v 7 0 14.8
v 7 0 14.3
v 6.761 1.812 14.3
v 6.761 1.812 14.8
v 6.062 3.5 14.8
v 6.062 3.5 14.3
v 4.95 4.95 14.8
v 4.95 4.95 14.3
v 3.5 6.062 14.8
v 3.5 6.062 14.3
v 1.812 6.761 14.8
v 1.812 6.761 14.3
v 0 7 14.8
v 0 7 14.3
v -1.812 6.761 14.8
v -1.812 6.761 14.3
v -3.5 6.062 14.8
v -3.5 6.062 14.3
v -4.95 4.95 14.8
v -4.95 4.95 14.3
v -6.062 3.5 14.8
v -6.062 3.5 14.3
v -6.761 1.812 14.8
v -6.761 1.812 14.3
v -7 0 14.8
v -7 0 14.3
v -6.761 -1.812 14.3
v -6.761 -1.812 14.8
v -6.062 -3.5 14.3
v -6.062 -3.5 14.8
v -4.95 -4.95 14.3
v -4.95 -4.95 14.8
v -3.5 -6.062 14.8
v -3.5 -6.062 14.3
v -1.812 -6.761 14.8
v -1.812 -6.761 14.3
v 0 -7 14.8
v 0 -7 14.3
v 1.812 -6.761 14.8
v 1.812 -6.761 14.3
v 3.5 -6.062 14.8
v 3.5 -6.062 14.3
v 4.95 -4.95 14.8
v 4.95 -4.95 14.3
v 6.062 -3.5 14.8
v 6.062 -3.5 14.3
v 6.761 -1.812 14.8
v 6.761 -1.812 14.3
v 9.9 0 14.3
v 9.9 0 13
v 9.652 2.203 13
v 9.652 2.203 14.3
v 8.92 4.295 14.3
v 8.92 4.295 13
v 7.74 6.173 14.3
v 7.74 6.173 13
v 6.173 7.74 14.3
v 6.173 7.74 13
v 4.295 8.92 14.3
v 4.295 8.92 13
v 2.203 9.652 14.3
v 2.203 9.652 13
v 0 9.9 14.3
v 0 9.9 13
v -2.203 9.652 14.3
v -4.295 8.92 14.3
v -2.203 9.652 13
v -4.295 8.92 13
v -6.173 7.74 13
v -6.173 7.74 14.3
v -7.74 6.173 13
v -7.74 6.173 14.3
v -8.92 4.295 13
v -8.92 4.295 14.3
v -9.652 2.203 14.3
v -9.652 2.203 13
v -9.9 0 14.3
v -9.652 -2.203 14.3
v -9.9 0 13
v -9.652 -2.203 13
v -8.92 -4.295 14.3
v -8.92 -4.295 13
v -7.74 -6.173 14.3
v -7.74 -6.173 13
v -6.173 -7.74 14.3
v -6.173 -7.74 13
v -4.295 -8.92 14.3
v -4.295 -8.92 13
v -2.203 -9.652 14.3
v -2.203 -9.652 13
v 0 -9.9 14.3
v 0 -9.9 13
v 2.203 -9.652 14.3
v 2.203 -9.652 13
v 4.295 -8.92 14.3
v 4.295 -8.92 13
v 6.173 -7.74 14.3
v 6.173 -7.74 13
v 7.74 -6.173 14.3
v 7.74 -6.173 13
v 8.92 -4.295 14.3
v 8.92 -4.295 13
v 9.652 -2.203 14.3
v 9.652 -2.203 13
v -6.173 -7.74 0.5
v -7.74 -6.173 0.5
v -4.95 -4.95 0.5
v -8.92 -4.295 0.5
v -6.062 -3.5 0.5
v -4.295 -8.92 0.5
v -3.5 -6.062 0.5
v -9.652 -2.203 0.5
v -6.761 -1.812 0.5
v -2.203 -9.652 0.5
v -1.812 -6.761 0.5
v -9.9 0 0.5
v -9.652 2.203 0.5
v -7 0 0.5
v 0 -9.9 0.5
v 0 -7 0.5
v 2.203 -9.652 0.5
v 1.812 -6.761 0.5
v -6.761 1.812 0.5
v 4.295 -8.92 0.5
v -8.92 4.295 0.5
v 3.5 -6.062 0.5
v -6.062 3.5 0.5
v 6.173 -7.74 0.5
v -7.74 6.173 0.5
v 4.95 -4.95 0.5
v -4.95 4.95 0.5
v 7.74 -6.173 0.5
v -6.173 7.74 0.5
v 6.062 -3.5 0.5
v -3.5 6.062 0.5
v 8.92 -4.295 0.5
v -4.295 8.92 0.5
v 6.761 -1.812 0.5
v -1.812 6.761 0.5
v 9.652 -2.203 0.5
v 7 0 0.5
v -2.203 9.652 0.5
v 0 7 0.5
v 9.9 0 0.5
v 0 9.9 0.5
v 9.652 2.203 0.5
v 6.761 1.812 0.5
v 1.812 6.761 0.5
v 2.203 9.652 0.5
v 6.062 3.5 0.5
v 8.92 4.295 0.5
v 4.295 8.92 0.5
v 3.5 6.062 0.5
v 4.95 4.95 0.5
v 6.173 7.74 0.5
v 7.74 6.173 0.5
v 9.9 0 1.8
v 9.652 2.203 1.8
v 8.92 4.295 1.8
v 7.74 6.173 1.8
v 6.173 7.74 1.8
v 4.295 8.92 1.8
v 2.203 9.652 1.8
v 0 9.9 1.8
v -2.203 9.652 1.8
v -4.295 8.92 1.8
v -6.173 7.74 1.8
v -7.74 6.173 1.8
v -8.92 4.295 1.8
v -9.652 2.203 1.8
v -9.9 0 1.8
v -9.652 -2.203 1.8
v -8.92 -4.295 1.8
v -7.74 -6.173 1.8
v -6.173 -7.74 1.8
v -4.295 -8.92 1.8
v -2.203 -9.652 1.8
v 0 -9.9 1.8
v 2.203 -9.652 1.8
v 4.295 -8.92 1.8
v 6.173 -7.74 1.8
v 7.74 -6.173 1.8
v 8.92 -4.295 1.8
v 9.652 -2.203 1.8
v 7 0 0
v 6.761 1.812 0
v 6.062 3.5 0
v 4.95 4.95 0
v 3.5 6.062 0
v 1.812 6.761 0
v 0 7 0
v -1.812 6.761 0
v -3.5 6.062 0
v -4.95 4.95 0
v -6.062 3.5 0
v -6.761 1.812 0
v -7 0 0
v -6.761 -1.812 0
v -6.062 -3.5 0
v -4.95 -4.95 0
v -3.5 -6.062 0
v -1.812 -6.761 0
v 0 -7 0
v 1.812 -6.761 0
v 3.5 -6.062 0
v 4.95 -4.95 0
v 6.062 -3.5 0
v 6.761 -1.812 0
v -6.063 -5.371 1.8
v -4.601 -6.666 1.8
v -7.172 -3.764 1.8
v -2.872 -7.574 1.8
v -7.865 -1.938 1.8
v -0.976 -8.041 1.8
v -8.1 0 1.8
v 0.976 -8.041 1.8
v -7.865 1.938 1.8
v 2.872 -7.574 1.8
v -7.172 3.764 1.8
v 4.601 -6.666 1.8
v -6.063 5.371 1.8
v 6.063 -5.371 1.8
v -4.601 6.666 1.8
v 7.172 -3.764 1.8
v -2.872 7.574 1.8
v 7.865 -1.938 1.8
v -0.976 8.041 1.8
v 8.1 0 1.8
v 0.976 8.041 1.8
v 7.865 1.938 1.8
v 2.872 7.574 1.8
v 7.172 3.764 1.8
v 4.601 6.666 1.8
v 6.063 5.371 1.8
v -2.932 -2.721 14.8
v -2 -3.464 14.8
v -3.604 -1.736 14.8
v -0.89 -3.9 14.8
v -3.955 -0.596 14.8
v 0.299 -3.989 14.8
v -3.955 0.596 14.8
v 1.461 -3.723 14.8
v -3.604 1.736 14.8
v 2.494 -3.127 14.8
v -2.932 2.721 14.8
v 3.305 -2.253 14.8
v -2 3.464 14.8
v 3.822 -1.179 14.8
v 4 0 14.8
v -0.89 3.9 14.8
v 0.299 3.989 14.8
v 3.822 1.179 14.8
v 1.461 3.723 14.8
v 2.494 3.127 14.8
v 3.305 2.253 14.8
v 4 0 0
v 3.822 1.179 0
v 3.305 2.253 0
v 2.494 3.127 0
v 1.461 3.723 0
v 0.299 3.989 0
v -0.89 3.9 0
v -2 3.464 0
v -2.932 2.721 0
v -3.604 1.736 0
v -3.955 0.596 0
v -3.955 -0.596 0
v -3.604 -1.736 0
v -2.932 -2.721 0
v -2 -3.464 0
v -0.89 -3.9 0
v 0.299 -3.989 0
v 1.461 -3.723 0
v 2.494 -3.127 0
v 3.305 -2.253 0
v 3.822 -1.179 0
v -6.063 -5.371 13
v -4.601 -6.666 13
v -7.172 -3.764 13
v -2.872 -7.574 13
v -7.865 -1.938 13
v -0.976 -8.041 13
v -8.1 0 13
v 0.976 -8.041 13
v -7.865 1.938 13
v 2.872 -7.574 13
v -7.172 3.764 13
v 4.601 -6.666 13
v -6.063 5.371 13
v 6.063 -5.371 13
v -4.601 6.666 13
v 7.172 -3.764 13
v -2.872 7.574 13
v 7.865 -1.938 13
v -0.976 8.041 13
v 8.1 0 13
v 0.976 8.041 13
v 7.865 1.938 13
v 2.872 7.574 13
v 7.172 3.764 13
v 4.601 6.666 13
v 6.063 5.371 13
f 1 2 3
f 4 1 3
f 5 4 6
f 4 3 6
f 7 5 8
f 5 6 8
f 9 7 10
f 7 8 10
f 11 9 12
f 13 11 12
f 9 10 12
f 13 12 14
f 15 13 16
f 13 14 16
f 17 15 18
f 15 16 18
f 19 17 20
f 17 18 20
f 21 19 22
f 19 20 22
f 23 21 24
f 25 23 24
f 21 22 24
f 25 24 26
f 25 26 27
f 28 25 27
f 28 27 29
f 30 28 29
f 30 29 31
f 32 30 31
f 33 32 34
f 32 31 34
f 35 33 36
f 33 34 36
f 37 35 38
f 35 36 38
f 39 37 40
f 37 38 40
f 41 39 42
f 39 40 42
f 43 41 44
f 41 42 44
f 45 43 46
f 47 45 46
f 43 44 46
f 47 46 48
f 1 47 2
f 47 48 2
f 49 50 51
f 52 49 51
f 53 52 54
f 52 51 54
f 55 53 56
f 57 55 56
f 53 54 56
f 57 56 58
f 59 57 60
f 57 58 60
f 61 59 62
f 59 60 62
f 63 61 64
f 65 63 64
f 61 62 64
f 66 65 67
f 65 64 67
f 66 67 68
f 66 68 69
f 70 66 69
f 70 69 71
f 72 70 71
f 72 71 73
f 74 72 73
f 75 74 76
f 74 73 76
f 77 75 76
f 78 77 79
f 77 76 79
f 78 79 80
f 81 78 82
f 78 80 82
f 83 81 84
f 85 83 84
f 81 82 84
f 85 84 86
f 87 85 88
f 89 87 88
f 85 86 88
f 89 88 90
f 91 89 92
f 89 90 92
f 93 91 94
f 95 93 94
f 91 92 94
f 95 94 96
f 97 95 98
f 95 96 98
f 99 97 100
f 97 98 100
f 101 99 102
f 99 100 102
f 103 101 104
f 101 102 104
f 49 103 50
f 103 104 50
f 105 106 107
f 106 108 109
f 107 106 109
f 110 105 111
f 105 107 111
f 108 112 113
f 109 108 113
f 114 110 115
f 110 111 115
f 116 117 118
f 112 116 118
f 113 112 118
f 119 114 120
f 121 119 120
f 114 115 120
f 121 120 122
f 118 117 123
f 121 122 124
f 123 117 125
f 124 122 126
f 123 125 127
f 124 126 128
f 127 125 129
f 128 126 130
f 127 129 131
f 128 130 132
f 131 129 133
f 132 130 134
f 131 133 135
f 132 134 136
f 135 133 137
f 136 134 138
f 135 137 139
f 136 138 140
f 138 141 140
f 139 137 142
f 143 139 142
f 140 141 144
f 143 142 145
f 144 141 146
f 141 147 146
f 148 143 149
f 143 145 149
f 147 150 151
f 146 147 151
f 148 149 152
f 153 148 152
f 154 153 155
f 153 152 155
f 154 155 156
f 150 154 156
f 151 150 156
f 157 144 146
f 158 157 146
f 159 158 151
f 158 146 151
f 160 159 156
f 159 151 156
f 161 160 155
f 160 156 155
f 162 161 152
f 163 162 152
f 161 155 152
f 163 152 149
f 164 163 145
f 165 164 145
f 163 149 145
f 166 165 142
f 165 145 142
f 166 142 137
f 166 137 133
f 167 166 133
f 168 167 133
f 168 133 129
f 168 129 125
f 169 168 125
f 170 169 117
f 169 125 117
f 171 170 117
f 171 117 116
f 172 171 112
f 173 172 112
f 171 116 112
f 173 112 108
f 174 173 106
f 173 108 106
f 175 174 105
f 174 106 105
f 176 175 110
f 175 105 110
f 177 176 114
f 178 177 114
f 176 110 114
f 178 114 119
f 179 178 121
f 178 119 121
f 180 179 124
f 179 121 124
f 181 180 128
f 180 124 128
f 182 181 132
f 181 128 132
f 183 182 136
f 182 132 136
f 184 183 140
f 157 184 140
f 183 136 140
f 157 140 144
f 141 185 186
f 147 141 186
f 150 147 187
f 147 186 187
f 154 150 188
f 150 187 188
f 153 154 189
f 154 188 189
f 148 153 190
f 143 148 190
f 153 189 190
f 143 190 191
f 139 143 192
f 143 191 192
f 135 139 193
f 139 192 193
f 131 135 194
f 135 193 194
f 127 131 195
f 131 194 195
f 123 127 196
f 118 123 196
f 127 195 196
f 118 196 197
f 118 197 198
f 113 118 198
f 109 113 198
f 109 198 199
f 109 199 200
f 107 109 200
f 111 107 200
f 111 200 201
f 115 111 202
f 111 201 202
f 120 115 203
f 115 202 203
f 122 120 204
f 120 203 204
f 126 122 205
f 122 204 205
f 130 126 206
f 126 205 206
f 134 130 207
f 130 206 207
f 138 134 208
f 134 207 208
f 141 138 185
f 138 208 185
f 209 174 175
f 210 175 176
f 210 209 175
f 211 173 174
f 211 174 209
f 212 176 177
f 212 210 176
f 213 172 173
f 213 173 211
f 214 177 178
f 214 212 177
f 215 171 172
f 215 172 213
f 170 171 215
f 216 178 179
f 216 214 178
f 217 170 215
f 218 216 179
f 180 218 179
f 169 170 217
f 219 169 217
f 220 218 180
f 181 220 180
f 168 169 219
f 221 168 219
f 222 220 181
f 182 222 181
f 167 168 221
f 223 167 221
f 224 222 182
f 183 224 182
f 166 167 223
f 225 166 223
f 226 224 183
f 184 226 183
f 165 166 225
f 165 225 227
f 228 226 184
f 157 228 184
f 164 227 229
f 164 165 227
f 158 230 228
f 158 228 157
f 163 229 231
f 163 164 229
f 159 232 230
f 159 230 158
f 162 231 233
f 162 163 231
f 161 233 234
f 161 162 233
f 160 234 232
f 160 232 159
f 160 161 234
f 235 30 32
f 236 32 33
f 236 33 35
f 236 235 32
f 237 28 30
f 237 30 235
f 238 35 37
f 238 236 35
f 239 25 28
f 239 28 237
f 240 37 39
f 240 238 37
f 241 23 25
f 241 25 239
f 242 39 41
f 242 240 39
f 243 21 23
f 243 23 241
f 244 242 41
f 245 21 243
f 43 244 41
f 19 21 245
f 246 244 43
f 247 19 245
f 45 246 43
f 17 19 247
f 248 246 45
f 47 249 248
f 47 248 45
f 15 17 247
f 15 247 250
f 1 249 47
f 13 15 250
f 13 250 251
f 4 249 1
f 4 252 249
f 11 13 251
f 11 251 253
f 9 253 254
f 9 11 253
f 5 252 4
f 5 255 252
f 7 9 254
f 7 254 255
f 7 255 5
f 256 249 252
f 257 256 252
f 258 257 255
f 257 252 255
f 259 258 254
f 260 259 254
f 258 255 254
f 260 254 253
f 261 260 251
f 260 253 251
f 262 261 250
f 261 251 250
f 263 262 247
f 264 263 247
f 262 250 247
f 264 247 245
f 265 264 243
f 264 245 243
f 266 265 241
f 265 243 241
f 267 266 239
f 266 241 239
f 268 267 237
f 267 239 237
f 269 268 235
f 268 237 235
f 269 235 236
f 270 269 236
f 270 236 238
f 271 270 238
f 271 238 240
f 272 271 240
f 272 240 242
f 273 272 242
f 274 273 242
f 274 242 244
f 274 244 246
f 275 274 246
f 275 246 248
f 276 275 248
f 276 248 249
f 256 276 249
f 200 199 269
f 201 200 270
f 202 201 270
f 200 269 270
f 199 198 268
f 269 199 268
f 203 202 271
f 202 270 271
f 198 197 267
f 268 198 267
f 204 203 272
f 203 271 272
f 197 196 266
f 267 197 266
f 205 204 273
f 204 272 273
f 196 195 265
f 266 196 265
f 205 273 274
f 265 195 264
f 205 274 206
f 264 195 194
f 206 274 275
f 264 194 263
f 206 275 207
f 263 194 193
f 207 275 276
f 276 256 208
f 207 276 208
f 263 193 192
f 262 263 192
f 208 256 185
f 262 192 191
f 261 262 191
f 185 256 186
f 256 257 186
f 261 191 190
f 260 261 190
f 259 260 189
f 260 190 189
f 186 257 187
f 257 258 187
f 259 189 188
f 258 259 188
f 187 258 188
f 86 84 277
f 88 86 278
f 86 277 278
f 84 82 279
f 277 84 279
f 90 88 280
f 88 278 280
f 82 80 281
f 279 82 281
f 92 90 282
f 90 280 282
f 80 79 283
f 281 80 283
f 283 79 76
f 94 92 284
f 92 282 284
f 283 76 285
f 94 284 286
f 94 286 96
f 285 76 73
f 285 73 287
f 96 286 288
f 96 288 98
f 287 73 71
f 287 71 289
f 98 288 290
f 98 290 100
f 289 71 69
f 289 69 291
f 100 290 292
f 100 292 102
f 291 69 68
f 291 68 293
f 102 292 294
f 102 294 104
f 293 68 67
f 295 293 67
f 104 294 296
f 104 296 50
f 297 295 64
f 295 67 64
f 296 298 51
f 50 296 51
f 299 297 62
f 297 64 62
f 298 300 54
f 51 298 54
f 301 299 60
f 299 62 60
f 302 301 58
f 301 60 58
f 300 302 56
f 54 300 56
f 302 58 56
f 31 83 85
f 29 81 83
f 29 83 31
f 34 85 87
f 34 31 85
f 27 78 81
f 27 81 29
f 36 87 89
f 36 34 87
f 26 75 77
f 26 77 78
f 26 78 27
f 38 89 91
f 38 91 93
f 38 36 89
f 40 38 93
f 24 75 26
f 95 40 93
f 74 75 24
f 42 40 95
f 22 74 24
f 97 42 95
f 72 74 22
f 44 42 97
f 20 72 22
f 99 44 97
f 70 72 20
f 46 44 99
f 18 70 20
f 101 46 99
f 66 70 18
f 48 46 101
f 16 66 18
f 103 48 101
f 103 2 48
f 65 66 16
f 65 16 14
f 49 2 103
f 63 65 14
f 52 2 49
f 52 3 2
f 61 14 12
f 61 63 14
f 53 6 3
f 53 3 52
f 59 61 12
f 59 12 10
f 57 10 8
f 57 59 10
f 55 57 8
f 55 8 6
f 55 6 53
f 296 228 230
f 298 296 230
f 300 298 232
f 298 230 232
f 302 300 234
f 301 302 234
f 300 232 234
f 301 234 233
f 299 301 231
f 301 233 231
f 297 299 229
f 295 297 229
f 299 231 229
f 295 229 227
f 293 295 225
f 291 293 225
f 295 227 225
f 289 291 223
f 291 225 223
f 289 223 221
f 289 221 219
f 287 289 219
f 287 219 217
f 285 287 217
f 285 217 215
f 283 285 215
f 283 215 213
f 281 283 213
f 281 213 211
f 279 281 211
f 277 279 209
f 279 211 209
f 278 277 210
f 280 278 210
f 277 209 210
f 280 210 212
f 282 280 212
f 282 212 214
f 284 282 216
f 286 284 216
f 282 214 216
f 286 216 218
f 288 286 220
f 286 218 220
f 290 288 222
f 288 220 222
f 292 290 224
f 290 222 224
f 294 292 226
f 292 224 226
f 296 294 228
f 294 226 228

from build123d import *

# Parameters (mm, degrees)
SKETCH1_R           = 7
BOSS_EXTRUDE1_DEPTH = 0.5
SKETCH2_R           = 9.9
BOSS_EXTRUDE2_DEPTH = 1.3
SKETCH3_R           = 8.1
BOSS_EXTRUDE3_DEPTH = 11.2
SKETCH4_R           = 9.9
BOSS_EXTRUDE4_DEPTH = 1.3
SKETCH5_R           = 7
BOSS_EXTRUDE5_DEPTH = 0.5
SKETCH6_R           = 4
CUT_EXTRUDE1_DEPTH  = 21.373021376


with BuildPart() as part:
    # Sketch1 → Boss-Extrude1 (new body)
    with BuildSketch(Plane.XY):
        Circle(SKETCH1_R)
    extrude(amount=BOSS_EXTRUDE1_DEPTH)

    # Sketch2 → Boss-Extrude2 (add)
    with BuildSketch(Plane.XY.offset(0.5)):
        Circle(SKETCH2_R)
    extrude(amount=BOSS_EXTRUDE2_DEPTH)

    # Sketch3 → Boss-Extrude3 (add)
    with BuildSketch(Plane.XY.offset(1.8)):
        Circle(SKETCH3_R)
    extrude(amount=BOSS_EXTRUDE3_DEPTH)

    # Sketch4 → Boss-Extrude4 (add)
    with BuildSketch(Plane.XY.offset(13)):
        Circle(SKETCH4_R)
    extrude(amount=BOSS_EXTRUDE4_DEPTH)

    # Sketch5 → Boss-Extrude5 (add)
    with BuildSketch(Plane.XY.offset(14.3)):
        Circle(SKETCH5_R)
    extrude(amount=BOSS_EXTRUDE5_DEPTH)

    # Sketch6 → Cut-Extrude1 (cut, through all)
    with BuildSketch(Plane.XY.offset(14.8)):
        Circle(SKETCH6_R)
    extrude(amount=-CUT_EXTRUDE1_DEPTH, mode=Mode.SUBTRACT)


solid = part.part
